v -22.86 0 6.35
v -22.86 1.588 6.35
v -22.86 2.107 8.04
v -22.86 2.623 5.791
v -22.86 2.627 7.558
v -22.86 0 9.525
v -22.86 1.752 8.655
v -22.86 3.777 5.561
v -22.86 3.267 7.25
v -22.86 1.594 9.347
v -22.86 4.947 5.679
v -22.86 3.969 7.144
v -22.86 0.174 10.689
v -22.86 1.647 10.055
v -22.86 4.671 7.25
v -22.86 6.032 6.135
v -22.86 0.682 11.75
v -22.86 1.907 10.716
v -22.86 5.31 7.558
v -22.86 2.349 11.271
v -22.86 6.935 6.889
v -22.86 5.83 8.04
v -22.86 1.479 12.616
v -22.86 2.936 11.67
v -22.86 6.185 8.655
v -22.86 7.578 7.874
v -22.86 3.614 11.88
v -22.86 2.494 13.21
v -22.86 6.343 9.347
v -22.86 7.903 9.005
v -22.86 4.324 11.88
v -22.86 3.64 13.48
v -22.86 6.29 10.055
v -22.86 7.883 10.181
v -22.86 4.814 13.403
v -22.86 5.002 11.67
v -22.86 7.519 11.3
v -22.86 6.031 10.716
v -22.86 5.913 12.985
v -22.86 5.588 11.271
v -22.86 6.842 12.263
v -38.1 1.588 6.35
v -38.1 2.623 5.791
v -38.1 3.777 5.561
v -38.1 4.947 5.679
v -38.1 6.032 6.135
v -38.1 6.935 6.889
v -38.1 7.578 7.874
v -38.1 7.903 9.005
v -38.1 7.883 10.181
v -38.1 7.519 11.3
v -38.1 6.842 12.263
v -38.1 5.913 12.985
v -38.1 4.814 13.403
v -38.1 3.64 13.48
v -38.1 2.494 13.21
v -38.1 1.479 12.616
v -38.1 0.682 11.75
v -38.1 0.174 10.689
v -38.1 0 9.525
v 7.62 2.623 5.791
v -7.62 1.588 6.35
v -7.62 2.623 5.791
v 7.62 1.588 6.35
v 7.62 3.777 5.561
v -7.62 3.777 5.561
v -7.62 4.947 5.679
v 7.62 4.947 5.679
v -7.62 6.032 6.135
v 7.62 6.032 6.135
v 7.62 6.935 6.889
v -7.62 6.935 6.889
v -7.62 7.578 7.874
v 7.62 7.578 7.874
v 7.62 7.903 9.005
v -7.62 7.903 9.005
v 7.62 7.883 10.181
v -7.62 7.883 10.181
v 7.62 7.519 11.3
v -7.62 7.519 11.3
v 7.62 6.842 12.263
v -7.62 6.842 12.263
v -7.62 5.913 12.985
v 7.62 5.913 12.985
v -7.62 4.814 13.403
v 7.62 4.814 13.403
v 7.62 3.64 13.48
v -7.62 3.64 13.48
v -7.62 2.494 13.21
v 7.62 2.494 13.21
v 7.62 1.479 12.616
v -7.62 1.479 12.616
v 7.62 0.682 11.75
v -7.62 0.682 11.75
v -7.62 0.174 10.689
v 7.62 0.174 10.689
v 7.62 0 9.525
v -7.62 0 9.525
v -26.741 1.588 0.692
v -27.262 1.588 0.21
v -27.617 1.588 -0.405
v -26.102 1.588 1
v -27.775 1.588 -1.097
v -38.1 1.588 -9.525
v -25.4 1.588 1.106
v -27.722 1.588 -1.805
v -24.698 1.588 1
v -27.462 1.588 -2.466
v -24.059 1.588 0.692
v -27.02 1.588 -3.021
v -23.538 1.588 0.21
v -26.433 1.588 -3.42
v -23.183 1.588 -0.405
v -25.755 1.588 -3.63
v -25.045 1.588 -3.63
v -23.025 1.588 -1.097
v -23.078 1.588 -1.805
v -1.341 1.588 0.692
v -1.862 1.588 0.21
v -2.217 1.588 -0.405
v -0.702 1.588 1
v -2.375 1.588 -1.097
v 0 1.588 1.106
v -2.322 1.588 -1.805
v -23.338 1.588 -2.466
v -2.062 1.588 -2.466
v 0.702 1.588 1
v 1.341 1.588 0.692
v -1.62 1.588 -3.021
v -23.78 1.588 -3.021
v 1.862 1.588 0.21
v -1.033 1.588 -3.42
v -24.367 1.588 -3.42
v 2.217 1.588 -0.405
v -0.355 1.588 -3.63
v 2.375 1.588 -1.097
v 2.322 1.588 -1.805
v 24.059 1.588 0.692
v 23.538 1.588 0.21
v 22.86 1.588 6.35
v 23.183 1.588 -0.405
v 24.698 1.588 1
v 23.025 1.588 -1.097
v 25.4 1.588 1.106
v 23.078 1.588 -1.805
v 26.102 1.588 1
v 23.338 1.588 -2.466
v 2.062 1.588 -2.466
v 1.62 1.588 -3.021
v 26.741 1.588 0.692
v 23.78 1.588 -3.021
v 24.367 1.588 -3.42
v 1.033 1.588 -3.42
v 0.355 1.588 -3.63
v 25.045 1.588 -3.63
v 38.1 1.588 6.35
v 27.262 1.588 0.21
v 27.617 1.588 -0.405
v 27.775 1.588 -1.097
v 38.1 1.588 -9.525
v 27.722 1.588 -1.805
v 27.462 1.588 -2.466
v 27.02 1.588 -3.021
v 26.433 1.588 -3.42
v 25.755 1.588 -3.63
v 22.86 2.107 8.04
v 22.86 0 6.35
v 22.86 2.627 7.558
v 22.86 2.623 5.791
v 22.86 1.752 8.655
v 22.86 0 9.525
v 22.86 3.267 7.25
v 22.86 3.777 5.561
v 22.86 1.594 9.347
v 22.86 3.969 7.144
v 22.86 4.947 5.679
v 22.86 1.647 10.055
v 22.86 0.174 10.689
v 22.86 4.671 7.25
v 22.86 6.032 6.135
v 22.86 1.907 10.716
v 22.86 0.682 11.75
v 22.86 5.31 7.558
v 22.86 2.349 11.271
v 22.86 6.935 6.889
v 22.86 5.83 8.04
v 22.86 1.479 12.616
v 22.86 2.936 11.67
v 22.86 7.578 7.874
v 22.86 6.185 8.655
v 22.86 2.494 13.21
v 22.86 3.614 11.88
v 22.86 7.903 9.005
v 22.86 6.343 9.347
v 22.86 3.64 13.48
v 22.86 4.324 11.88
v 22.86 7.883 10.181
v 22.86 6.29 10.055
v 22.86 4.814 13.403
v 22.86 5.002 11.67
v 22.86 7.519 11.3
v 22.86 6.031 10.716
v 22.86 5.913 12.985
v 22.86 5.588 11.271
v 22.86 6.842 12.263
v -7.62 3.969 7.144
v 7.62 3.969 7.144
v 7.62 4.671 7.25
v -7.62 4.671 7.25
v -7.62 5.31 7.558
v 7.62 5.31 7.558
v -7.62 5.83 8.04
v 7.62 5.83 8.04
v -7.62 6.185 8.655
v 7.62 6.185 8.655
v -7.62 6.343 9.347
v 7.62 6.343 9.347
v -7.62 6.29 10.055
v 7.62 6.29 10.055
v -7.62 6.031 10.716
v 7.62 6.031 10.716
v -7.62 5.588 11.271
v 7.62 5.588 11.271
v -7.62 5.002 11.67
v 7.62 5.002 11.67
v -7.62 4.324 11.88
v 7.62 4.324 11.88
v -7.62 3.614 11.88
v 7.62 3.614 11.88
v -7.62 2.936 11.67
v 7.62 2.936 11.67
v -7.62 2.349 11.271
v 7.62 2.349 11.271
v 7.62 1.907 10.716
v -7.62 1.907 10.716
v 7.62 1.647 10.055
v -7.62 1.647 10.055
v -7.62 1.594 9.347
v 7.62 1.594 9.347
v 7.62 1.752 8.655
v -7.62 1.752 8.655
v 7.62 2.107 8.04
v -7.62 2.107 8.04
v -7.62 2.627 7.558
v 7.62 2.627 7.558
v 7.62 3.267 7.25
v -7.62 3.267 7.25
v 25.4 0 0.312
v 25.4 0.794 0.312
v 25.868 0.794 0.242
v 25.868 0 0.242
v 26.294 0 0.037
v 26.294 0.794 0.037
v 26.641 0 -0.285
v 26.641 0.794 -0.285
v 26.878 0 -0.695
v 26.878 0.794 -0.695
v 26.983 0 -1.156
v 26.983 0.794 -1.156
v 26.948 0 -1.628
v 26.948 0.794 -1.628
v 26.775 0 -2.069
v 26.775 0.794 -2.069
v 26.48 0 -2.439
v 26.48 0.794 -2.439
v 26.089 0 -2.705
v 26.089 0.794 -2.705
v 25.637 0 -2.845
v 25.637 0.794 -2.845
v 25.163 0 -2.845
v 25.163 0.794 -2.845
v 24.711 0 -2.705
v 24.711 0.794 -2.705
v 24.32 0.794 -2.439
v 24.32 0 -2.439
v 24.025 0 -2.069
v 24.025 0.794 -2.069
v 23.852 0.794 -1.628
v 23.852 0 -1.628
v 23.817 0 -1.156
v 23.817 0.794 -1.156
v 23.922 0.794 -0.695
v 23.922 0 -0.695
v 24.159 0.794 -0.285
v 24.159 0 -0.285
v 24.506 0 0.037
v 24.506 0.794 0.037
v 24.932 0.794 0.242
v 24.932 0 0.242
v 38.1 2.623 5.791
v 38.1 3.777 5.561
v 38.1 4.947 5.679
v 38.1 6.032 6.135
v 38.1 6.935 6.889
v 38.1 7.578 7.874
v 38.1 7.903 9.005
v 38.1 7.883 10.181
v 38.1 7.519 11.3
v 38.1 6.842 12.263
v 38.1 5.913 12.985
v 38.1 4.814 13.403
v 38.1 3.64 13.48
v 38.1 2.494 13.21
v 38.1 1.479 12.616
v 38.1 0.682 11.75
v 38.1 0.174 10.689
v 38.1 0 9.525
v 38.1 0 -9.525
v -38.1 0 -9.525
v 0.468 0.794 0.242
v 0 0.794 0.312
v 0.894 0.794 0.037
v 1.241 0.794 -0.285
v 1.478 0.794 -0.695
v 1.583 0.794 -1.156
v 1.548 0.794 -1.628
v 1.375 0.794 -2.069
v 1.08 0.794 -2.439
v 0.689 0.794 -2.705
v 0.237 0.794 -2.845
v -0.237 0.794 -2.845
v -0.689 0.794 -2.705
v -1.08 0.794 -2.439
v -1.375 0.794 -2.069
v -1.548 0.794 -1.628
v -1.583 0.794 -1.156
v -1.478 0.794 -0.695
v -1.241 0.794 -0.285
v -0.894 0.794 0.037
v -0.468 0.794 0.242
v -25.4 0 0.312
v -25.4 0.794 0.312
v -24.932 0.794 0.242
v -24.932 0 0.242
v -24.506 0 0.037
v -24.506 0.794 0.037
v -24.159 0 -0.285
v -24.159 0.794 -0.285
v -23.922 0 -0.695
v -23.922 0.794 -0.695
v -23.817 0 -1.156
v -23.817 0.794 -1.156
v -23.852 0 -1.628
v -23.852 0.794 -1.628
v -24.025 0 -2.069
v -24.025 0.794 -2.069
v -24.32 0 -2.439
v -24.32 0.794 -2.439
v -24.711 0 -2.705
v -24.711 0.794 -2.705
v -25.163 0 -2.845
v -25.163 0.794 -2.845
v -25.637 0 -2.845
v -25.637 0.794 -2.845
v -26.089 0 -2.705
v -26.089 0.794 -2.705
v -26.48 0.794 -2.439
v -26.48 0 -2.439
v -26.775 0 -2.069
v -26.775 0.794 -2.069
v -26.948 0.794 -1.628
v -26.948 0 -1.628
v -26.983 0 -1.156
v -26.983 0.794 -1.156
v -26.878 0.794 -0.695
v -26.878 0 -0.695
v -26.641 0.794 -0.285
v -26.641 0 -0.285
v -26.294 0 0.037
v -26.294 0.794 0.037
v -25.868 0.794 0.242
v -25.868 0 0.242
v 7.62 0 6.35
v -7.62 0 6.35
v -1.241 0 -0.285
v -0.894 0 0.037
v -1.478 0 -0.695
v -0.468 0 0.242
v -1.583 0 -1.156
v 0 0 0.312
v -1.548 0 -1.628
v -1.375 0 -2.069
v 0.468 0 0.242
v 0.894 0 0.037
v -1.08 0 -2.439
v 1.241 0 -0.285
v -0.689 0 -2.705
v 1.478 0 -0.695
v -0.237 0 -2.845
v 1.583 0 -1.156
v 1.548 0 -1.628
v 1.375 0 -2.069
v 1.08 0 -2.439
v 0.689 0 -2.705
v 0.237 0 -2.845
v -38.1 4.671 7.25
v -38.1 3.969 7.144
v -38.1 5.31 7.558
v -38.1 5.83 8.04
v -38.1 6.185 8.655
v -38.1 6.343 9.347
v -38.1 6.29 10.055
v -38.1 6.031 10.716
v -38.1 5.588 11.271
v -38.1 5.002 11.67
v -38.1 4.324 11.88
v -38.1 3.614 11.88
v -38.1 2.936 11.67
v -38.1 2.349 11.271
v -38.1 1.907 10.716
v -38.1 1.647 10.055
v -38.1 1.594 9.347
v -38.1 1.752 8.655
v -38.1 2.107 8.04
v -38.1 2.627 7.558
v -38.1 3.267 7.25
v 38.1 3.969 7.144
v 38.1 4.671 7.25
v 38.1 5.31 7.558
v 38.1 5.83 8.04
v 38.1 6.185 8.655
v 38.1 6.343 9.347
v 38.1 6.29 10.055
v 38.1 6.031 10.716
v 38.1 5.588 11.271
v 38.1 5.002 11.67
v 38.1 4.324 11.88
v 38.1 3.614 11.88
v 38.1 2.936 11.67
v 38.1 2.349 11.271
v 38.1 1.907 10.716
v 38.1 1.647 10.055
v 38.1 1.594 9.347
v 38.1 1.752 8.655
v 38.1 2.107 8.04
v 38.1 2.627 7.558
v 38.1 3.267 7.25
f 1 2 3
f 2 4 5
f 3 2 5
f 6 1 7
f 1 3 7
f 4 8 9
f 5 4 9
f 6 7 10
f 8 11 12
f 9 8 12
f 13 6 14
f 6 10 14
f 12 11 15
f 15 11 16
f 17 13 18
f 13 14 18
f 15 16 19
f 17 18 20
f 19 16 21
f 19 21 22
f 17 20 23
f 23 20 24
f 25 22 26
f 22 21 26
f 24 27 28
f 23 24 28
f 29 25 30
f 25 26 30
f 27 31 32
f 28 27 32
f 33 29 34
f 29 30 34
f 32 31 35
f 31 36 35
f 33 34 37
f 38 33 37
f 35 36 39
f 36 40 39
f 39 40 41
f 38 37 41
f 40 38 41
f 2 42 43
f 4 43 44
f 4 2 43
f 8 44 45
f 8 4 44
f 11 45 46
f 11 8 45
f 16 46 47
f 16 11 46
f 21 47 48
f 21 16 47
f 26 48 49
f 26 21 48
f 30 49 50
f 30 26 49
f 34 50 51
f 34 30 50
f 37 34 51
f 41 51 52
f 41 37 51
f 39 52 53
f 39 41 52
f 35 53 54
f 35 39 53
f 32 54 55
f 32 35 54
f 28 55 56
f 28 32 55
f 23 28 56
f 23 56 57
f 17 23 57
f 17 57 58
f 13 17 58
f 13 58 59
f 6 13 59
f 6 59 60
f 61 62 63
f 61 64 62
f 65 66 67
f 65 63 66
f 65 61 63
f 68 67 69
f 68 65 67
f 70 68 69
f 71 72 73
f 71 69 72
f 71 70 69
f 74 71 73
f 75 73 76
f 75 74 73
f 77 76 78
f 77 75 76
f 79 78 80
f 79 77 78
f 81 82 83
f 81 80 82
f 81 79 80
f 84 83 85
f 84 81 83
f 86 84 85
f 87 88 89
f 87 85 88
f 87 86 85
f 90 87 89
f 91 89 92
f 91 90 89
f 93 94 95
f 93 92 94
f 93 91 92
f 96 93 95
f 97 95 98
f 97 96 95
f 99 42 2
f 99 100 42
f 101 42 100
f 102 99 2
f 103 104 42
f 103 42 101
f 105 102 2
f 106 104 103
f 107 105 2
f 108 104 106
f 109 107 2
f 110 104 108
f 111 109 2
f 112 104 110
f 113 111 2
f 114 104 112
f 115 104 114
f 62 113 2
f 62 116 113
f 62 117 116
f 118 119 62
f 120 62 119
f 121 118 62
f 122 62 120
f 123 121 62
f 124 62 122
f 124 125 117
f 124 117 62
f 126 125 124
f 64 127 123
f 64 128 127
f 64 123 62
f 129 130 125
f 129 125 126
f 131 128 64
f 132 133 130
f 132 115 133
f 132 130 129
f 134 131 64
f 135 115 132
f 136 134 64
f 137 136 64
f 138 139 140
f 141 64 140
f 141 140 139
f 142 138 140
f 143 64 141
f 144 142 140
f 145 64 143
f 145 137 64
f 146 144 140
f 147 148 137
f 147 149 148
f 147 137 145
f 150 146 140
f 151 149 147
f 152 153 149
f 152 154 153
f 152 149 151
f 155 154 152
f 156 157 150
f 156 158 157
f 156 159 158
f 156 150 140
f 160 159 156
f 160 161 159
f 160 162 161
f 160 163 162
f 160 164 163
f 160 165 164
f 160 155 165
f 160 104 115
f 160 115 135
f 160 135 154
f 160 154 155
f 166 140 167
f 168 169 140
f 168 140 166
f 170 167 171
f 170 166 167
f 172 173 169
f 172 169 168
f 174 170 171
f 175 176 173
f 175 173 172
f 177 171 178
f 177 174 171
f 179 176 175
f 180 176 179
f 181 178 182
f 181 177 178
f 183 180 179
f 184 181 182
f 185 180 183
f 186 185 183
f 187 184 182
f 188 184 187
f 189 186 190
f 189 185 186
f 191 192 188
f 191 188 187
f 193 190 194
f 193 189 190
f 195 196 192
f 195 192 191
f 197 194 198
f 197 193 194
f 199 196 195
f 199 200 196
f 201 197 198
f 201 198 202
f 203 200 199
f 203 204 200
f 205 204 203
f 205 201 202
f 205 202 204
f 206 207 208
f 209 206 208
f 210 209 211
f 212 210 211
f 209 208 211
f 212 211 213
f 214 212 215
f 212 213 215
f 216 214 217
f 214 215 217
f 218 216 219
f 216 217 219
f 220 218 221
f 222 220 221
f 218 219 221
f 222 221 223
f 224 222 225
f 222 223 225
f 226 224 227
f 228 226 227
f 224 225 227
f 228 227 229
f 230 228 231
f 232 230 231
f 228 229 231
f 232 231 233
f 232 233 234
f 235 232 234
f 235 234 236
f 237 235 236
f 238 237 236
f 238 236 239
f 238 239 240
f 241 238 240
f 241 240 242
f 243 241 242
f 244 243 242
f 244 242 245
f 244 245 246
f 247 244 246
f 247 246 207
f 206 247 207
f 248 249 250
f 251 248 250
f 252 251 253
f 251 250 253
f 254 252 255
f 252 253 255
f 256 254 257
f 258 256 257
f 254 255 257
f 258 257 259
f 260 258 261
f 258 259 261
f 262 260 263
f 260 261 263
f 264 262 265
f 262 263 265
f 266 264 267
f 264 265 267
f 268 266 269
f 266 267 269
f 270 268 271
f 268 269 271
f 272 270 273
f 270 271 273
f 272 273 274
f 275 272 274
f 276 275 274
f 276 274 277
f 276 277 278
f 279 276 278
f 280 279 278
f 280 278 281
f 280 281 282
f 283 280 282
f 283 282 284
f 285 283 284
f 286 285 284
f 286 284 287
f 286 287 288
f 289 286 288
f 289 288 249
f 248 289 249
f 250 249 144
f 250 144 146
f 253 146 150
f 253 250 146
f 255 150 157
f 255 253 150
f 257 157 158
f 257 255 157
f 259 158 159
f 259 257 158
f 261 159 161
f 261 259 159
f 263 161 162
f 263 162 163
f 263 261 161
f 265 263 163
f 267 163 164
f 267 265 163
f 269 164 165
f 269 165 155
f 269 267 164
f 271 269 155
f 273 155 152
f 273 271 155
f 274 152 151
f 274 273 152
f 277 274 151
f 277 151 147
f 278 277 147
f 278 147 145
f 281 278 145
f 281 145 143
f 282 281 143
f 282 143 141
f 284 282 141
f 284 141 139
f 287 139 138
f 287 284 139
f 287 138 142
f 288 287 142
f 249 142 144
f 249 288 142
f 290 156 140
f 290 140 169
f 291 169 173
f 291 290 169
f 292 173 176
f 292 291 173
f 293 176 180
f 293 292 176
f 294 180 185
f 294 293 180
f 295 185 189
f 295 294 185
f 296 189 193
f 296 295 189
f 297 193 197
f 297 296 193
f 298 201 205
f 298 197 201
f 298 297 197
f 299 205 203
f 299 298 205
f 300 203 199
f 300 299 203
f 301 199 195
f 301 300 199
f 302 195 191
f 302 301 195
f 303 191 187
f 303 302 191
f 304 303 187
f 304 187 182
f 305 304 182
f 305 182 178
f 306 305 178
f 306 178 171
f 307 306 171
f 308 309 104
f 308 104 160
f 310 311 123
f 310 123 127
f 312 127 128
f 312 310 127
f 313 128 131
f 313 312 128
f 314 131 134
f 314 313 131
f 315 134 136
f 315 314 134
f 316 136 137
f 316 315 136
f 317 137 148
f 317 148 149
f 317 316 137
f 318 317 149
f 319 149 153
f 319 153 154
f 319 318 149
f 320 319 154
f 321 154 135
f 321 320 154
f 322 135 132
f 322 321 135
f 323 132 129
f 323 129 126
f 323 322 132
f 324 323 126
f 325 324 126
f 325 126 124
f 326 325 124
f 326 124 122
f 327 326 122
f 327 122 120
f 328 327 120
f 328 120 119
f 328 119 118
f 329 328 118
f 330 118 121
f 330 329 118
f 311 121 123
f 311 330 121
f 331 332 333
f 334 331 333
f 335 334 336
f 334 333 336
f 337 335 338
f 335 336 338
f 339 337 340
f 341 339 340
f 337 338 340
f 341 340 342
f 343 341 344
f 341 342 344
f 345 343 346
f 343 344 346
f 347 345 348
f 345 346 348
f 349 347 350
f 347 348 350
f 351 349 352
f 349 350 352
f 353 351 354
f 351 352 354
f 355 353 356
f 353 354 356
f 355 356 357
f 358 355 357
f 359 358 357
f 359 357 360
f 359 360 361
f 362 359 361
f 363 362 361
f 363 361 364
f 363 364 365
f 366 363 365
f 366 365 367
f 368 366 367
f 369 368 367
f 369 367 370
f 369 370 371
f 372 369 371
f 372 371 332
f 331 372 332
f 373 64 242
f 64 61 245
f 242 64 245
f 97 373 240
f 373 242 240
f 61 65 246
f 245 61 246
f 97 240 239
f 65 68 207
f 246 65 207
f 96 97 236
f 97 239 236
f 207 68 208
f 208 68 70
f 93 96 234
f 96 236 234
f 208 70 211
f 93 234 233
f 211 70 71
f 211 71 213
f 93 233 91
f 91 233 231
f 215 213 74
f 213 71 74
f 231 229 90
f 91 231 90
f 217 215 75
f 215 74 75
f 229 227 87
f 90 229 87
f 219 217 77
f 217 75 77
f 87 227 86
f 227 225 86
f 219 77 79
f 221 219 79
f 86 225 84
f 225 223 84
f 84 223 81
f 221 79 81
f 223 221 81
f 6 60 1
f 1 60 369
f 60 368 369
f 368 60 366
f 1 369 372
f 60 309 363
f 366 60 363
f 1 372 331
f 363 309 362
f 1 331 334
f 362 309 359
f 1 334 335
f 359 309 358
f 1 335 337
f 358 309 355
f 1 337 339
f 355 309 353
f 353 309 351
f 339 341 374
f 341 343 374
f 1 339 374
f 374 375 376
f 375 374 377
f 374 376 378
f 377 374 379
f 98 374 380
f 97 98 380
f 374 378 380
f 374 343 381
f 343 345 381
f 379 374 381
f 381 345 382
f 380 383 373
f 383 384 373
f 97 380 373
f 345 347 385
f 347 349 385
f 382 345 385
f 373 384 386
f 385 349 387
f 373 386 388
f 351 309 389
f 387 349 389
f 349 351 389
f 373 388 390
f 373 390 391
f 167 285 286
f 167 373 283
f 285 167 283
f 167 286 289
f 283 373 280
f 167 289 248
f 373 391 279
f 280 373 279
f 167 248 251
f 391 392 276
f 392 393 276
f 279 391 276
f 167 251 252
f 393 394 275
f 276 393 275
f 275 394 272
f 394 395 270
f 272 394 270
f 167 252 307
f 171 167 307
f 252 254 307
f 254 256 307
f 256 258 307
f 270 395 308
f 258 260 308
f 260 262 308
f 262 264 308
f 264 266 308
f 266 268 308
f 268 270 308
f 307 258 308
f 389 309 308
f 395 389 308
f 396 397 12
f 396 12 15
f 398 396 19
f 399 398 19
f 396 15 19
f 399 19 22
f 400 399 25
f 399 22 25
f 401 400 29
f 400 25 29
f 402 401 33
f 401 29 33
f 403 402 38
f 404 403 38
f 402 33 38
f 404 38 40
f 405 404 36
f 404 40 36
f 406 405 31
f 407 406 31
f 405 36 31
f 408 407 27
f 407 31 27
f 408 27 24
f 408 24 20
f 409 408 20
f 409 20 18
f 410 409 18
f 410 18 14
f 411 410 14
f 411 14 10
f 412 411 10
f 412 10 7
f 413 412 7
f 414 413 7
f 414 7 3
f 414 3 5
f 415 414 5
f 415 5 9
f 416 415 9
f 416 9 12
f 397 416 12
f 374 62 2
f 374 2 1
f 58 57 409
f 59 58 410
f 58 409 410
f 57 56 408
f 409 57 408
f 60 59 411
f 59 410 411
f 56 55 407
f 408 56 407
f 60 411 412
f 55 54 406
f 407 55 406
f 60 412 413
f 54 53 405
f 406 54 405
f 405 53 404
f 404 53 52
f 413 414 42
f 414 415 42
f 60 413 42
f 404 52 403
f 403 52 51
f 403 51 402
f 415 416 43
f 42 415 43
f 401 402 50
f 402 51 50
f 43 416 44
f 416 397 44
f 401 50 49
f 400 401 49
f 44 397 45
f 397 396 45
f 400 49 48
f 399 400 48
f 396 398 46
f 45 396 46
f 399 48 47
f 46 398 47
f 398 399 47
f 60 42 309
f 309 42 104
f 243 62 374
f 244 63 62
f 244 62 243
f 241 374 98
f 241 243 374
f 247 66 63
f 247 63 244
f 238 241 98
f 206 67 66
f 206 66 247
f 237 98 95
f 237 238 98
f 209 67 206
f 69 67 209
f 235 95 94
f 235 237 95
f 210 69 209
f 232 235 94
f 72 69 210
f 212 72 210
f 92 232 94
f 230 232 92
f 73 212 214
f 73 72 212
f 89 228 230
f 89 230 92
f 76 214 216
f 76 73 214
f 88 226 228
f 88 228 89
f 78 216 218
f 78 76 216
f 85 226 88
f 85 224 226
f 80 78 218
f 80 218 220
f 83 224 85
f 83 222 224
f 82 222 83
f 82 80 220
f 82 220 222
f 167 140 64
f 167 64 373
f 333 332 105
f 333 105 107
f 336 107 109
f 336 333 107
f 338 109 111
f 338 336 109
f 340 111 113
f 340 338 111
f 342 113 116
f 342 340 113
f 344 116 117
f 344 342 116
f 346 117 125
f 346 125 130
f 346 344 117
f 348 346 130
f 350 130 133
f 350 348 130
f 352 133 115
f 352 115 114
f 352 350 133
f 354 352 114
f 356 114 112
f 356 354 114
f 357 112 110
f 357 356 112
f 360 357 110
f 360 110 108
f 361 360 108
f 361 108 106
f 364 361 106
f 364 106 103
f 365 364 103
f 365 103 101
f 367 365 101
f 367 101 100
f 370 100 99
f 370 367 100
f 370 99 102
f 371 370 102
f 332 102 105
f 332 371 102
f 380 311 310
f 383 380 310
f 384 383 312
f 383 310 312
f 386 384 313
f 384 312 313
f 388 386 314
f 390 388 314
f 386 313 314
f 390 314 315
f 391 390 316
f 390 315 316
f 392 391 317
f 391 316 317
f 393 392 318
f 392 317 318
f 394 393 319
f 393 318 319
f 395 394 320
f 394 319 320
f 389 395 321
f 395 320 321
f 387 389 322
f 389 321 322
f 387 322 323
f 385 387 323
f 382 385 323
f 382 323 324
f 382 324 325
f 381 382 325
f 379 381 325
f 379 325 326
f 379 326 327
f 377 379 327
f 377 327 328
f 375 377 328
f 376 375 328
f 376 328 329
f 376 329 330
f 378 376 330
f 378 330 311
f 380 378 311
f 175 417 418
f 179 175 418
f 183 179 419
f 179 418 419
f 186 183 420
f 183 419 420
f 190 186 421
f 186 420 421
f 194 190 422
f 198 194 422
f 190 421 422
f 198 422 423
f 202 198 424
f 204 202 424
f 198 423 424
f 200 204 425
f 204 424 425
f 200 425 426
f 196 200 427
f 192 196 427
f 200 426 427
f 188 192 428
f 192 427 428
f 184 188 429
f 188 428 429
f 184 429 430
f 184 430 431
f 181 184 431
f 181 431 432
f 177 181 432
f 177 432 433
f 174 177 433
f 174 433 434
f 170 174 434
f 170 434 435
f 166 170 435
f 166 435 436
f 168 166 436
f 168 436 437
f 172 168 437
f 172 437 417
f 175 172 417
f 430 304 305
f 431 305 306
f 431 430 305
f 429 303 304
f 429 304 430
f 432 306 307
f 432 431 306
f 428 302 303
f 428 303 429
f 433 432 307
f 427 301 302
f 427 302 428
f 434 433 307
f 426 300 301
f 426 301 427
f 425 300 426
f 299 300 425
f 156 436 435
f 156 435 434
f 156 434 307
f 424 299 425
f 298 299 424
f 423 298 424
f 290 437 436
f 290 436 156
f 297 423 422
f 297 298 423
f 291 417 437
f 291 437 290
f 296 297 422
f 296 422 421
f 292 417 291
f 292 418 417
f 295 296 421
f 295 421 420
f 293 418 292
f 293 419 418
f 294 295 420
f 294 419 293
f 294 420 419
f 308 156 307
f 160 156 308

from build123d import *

# Parameters (mm, degrees)
SKETCH1_W                  = 76.2
SKETCH1_H                  = 19.05
BOSS_EXTRUDE1_DEPTH        = 1.5875
SKETCH2_R                  = 3.96875
SKETCH2_R_2                = 2.38125
BOSS_EXTRUDE2_DEPTH        = 76.2
SKETCH4_R                  = 1.5875
CUT_EXTRUDE1_DEPTH         = 41.914713601
CHAMFER1_SIZE              = 0.79375
LPATTERN1_COUNT            = 3
LPATTERN1_PITCH            = 25.4
CHAMFER1_OF_LPATTERN1_SIZE = 0.79375
CUT_EXTRUDE2_START         = -15.24
CUT_EXTRUDE2_DEPTH         = 15.24
LPATTERN2_COUNT            = 5
LPATTERN2_PITCH            = 15.24


with BuildPart() as part:
    # Sketch1 → Boss-Extrude1 (new body)
    with BuildSketch(Plane(origin=(0, 0, 0), x_dir=(1, 0, 0), z_dir=(0, 1, 0))):
        Rectangle(SKETCH1_W, SKETCH1_H)
    extrude(amount=BOSS_EXTRUDE1_DEPTH)

    # Sketch2 → Boss-Extrude2 (add)
    with BuildSketch(Plane(origin=(38.1, 0, 0), x_dir=(0, 0, -1), z_dir=(1, 0, 0))):
        with Locations((-9.525, 3.96875)):
            Circle(SKETCH2_R)
        with Locations((-9.525, 3.96875)):
            Circle(SKETCH2_R_2, mode=Mode.SUBTRACT)
    extrude(amount=-BOSS_EXTRUDE2_DEPTH)

    # Sketch4 → Cut-Extrude1 (cut, through all)
    with BuildSketch(Plane(origin=(0, 1.5875, 0), x_dir=(1, 0, 0), z_dir=(0, 1, 0))):
        with Locations(Location((-25.4, 1.275, 0), (0, 0, 270))):
            Circle(SKETCH4_R)
    cut_extrude1 = extrude(amount=-CUT_EXTRUDE1_DEPTH, mode=Mode.SUBTRACT)

    # Chamfer1
    chamfer1_edges = [part.edges().sort_by_distance(p)[0] for p in [
        (-25.4, 1.5875, -2.8625),
    ]]
    chamfer(chamfer1_edges, length=CHAMFER1_SIZE)

    # LPattern1: Cut-Extrude1 ×3
    with Locations(*[(i * LPATTERN1_PITCH, 0, 0) for i in range(1, LPATTERN1_COUNT)]):
        add(cut_extrude1, mode=Mode.SUBTRACT)

    # Chamfer1 of LPattern1
    chamfer1_of_lpattern1_edges = [part.edges().sort_by_distance(p)[0] for p in [
        (0, 1.5875, -2.8625),
        (25.4, 1.5875, -2.8625),
    ]]
    chamfer(chamfer1_of_lpattern1_edges, length=CHAMFER1_OF_LPATTERN1_SIZE)

    # Sketch5 → Cut-Extrude2 (cut)
    with BuildSketch(Plane(origin=(38.1, 0, 0), x_dir=(0, 0, -1), z_dir=(1, 0, 0)).offset(CUT_EXTRUDE2_START)):
        with BuildLine():
            Line((-6.35, 1.5875), (-6.35, 0))
            Line((-6.35, 0), (-9.525, 0))
            ThreePointArc((-9.525, 0), (-11.299878957, 7.518507914), (-6.35, 1.5875))
        make_face()
    cut_extrude2 = extrude(amount=-CUT_EXTRUDE2_DEPTH, mode=Mode.SUBTRACT)

    # LPattern2: Cut-Extrude2 ×5, 2 skipped
    with Locations(*[(-i * LPATTERN2_PITCH, 0, 0) for i in range(1, LPATTERN2_COUNT) if i not in (1, 3)]):
        add(cut_extrude2, mode=Mode.SUBTRACT)


solid = part.part
